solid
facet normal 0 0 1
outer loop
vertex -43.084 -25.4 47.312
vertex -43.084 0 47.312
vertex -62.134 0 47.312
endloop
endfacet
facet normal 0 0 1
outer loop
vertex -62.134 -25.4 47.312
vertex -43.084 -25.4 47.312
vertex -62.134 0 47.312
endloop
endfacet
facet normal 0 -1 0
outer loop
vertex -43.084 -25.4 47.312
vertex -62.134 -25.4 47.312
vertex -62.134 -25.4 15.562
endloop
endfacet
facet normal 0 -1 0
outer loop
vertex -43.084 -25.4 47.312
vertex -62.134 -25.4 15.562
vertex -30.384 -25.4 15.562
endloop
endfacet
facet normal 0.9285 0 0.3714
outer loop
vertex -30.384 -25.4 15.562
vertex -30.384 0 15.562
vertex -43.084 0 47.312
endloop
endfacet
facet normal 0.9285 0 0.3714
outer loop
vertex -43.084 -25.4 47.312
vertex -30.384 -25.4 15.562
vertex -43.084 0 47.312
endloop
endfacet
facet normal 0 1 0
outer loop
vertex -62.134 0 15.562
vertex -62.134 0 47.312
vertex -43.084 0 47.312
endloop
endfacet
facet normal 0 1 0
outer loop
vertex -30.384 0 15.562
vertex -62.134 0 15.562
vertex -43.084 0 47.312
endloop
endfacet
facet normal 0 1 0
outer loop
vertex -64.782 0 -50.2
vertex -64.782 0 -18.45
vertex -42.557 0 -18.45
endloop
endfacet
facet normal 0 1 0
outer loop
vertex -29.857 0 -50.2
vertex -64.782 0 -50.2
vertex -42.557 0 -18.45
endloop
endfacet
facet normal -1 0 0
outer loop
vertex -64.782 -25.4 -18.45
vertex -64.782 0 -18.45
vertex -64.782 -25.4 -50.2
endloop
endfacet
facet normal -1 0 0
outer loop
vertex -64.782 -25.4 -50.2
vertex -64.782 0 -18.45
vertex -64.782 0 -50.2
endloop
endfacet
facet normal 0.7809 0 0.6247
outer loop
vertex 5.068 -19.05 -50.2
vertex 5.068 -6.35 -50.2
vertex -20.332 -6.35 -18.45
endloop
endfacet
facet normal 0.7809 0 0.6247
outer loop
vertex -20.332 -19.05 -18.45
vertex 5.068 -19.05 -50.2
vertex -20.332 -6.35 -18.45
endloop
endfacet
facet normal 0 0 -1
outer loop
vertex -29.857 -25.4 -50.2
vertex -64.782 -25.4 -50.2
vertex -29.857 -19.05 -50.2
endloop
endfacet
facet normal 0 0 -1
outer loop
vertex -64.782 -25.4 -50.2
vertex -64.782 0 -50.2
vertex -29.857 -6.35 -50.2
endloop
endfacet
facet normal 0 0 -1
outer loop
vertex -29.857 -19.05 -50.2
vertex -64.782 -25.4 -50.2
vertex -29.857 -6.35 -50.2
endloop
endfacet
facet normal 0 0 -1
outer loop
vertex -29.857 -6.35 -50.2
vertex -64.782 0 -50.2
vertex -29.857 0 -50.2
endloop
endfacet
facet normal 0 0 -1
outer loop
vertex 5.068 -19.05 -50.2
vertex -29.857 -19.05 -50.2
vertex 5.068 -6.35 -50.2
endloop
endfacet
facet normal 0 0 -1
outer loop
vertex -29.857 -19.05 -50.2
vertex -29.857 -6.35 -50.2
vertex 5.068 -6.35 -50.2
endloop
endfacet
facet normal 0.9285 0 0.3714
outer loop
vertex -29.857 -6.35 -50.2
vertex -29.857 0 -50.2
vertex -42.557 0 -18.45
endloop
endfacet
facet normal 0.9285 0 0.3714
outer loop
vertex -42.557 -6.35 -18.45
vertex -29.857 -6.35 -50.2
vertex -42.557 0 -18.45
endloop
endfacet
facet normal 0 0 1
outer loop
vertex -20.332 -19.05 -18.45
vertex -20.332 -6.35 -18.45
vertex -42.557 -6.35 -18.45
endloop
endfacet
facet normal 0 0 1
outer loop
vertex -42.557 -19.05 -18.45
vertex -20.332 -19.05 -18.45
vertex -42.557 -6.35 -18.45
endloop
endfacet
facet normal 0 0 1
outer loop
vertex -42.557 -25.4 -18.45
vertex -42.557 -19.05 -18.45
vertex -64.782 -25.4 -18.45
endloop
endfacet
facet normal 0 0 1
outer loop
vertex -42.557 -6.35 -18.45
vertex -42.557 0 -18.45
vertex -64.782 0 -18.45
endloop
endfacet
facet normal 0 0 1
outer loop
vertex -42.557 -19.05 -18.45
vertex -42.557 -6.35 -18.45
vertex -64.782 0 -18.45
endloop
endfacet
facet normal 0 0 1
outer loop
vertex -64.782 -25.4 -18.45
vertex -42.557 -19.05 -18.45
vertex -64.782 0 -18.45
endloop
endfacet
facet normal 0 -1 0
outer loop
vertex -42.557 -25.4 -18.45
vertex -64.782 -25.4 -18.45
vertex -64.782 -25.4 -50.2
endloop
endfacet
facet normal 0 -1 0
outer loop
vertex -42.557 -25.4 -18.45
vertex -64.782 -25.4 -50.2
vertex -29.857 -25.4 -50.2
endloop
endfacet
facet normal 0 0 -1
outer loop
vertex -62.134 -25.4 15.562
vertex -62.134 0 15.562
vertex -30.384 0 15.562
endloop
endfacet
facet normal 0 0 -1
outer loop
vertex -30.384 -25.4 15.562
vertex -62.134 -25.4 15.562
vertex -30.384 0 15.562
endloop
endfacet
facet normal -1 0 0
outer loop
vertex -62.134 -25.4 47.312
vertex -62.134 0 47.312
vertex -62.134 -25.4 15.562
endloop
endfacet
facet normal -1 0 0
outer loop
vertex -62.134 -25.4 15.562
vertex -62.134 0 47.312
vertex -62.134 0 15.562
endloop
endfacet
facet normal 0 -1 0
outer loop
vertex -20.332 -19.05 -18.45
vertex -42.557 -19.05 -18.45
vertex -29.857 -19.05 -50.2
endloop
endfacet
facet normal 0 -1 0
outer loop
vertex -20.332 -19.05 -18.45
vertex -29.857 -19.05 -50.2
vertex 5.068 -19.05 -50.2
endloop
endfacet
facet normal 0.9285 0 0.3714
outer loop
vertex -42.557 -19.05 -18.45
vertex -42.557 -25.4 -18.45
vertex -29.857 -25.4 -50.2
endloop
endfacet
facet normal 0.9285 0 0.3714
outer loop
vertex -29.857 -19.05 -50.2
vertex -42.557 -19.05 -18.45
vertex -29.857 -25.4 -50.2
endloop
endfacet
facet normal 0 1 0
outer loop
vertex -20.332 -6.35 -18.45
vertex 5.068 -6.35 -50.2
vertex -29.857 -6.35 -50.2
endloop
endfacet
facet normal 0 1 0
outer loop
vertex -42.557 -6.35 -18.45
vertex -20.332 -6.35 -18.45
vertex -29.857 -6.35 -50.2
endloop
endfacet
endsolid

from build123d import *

# Parameters (mm, degrees)
F1_DEPTH = 25.4
F3_DEPTH = 25.4
F5_DEPTH = 6.35
F7_DEPTH = 6.35


with BuildPart() as f1:
    # F0 (on Front) → F1 (new body)
    with BuildSketch(Plane.XZ):
        Polygon((-43.08386, 47.312498), (-62.13386, 47.312498), (-62.13386, 15.562498), (-30.38386, 15.562498), align=None)
    extrude(amount=F1_DEPTH)


with BuildPart() as f3:
    # F2 (on Front) → F3 (new body)
    with BuildSketch(Plane.XZ):
        Polygon((-20.331509, -18.449531), (-64.781509, -18.449531), (-64.781509, -50.199531), (5.068491, -50.199531), align=None)
    extrude(amount=F3_DEPTH)

    # F4 (on face) → F5 (cut)
    with BuildSketch(Plane.XZ.offset(25.4)):
        Polygon((-20.331509, -18.449531), (-42.556509, -18.449531), (-29.856509, -50.199531), (5.068491, -50.199531), align=None)
    extrude(amount=-F5_DEPTH, mode=Mode.SUBTRACT)

    # F6 (on face) → F7 (cut)
    with BuildSketch(Plane(origin=(0, 0, 0), x_dir=(-1, 0, 0), z_dir=(0, 1, 0))):
        Polygon((29.856509, -50.199531), (42.556509, -18.449531), (20.331509, -18.449531), (-5.068491, -50.199531), align=None)
    extrude(amount=-F7_DEPTH, mode=Mode.SUBTRACT)


solid = Compound([f1.part, f3.part])
